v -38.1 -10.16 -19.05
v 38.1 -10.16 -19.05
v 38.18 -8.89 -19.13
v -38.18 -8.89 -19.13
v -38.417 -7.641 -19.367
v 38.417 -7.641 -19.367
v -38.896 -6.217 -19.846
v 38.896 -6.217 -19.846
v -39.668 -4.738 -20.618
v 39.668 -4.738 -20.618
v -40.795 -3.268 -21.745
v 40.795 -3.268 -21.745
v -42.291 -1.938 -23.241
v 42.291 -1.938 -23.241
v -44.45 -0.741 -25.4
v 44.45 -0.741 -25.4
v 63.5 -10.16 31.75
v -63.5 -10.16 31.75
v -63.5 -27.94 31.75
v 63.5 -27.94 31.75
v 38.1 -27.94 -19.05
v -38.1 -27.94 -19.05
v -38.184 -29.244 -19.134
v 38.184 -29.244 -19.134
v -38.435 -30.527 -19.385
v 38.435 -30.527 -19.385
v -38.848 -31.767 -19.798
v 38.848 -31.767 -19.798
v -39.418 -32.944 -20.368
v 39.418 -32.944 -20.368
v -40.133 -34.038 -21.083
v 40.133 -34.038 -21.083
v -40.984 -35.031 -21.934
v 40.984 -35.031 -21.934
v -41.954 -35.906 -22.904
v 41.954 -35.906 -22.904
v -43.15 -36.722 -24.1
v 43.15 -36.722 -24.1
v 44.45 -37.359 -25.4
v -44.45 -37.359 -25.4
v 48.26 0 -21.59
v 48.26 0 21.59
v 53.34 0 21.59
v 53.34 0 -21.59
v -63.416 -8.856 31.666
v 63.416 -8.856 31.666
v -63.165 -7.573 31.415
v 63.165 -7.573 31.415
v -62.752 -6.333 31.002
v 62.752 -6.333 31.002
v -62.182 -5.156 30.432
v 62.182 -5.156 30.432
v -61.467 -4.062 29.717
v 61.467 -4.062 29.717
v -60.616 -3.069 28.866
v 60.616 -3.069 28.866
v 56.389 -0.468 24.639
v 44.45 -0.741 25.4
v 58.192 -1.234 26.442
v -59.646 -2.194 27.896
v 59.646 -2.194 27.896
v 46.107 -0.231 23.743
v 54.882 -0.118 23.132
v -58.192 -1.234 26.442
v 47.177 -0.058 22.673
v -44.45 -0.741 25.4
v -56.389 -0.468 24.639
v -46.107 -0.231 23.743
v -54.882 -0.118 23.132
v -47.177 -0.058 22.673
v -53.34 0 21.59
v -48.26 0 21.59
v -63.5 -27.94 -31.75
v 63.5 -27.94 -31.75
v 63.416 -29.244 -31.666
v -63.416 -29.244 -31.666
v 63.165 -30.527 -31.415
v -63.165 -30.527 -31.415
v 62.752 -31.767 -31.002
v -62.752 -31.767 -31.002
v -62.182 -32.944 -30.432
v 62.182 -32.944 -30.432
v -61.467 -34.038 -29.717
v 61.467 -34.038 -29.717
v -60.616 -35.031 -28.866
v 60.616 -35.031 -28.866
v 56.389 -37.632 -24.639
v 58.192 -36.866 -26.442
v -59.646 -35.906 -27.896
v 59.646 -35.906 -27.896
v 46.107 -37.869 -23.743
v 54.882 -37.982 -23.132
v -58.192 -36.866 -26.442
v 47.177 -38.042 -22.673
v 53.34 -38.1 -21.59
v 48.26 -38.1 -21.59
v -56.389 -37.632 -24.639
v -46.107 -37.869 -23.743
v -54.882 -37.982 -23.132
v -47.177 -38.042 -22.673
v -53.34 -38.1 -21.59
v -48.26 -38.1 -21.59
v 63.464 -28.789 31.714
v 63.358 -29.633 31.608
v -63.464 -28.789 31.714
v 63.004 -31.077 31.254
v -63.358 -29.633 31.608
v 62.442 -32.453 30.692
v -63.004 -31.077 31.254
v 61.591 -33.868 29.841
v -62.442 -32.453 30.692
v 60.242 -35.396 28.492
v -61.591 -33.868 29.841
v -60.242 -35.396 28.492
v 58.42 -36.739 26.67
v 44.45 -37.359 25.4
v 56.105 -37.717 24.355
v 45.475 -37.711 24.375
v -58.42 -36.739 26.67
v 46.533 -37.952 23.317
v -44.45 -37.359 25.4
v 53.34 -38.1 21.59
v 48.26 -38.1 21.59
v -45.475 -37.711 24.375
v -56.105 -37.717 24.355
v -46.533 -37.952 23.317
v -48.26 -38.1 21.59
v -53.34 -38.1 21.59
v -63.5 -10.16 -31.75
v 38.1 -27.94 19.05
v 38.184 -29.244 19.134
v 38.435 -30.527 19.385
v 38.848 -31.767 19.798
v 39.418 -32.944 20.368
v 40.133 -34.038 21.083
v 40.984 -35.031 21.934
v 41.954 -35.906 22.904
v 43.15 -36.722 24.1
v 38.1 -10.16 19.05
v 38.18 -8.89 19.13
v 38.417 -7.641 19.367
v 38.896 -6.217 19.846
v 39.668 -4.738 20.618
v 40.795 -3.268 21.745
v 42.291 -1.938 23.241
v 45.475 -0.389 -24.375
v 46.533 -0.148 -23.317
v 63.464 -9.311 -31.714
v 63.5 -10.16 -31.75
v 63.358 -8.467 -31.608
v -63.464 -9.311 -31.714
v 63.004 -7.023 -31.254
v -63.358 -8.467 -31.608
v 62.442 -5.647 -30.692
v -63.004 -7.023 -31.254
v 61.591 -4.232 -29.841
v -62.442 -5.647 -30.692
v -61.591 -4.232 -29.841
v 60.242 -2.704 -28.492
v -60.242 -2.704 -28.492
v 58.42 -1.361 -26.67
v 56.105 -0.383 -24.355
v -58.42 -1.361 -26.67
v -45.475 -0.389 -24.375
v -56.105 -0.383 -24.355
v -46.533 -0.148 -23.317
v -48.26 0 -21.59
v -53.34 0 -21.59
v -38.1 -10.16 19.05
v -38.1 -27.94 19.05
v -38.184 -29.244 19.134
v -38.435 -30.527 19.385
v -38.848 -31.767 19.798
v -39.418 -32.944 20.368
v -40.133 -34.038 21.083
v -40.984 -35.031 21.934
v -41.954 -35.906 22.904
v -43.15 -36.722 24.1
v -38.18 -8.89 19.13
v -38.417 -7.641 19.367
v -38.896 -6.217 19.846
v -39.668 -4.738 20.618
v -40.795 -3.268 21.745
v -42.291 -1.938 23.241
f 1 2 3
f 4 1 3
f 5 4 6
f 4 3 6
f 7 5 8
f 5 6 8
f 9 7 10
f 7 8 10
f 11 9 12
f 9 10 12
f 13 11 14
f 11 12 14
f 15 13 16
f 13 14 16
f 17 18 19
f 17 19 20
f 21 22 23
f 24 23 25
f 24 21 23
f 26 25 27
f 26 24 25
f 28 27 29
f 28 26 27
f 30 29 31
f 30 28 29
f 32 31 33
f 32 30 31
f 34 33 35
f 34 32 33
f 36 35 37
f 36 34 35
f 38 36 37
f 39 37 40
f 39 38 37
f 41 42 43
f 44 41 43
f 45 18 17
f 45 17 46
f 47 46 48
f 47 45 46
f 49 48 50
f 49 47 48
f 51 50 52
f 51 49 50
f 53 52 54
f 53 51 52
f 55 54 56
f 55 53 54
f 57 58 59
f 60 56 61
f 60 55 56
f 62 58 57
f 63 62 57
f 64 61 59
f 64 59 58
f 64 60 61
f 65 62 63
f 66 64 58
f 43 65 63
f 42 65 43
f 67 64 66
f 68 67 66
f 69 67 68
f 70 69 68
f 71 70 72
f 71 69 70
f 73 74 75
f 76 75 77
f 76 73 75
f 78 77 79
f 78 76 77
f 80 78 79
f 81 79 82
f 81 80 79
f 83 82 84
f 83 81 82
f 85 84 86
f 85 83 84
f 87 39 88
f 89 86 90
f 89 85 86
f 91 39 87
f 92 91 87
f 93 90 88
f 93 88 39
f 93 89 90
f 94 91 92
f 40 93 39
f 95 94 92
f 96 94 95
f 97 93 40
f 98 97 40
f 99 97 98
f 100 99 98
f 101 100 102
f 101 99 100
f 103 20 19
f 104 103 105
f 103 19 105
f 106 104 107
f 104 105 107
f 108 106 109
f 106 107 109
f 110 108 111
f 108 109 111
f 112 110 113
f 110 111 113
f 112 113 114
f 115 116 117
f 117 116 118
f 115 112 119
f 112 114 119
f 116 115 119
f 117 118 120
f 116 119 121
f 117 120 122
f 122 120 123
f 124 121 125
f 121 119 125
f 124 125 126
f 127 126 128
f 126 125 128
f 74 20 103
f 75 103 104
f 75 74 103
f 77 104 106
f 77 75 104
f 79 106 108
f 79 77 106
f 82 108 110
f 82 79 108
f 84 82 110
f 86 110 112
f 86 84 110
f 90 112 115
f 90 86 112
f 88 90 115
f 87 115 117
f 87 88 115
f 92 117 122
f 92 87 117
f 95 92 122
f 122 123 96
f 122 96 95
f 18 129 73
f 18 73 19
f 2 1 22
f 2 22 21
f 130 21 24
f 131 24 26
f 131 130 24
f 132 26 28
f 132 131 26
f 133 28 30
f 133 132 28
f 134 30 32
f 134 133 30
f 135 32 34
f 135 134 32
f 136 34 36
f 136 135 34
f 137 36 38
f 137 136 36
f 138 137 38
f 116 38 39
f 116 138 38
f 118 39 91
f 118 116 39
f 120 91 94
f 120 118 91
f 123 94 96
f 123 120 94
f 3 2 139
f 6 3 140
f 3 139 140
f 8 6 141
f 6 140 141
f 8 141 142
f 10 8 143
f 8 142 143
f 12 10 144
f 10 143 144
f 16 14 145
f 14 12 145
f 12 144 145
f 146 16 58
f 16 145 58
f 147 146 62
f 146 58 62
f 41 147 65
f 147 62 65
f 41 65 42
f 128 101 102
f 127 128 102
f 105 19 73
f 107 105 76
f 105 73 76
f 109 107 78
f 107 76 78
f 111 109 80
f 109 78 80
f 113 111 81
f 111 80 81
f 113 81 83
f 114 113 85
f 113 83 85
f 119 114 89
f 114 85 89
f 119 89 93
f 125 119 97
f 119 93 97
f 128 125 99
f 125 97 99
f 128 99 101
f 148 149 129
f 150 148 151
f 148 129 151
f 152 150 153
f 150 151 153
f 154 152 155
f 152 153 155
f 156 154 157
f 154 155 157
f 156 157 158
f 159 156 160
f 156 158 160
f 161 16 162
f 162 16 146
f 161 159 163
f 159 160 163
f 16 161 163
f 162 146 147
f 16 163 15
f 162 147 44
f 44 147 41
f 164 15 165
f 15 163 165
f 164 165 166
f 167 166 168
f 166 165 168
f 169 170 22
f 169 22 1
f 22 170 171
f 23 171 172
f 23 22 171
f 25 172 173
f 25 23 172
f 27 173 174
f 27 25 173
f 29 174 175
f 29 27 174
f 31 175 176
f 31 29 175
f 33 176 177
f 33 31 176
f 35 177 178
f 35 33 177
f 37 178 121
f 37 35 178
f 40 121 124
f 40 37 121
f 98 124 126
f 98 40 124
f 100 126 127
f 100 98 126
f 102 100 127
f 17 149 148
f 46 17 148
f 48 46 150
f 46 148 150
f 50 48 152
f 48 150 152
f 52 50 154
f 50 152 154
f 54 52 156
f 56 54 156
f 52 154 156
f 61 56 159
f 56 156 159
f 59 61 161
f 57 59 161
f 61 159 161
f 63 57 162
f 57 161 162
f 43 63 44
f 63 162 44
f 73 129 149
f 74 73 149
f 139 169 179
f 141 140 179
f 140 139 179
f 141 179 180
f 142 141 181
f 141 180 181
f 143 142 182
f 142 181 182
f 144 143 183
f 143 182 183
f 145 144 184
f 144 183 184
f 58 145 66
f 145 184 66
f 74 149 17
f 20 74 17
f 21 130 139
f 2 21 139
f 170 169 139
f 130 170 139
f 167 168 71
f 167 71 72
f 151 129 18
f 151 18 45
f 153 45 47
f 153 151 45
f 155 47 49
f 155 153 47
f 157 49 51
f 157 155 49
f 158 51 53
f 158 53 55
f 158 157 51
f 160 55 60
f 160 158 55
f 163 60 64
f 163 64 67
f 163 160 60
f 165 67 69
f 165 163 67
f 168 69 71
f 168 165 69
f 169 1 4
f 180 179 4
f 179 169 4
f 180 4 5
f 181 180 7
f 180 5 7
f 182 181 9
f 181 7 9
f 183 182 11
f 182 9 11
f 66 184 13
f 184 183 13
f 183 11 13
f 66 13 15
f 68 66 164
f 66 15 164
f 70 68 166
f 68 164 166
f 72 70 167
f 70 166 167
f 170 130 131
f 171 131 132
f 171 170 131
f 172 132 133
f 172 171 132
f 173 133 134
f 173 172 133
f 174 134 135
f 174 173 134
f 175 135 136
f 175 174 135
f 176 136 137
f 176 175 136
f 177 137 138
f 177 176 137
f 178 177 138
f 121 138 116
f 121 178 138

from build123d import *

# Parameters (mm, degrees)
F0_W          = 127
F0_H          = 63.5
F0_W_2        = 76.2
F0_H_2        = 38.1
F1_DEPTH      = 38.1
F2_T1_DEPTH   = 177.8
F2_T3_DEPTH   = 114.3
F2_T5_DEPTH   = 76.2
F2_T7_DEPTH   = 38.1
F2_T13_DEPTH  = 101.6
F2_T17_DEPTH  = 63.5
F2_T25_DEPTH  = 101.6
F2_T29_DEPTH  = 63.5
F2_T37_DEPTH  = 63.5
F2_T42_DEPTH  = 101.6
F2_T49_DEPTH  = 101.6
F2_T53_DEPTH  = 63.5
F2_T61_DEPTH  = 101.6
F2_T65_DEPTH  = 63.5
F2_T73_DEPTH  = 101.6
F2_T77_DEPTH  = 63.5
F2_T85_DEPTH  = 63.5
F2_T90_DEPTH  = 101.6
F2_T97_DEPTH  = 101.6
F2_T101_DEPTH = 63.5


# Not quite as in the source:
# - a fillet or chamfer that OpenCascade refuses, or shapes differently, is made with other operations: its cross-section is extruded or revolved along the edge and cut away or added


with BuildPart() as f1:
    # F0 (on Front) → F1 (new body)
    with BuildSketch(Plane.XZ):
        Rectangle(F0_W, F0_H)
        Rectangle(F0_W_2, F0_H_2, mode=Mode.SUBTRACT)
    extrude(amount=F1_DEPTH)

    # F2: fillet of radius 10.16 on 16 edges, made by hand

    # F2_s2 → F2_t1 (cut)
    with BuildSketch(Plane.YZ.offset(-88.9)):
        with BuildLine():
            ThreePointArc((-27.94, -31.75), (-35.1242048969, -28.7742048969), (-38.1, -21.59))
            Line((-38.1, -21.59), (-38.1, -31.75))
            Line((-38.1, -31.75), (-27.94, -31.75))
        make_face()
        with BuildLine():
            ThreePointArc((-27.94, 31.75), (-35.1242048969, 28.7742048969), (-38.1, 21.59))
            Line((-38.1, 21.59), (-38.1, 31.75))
            Line((-38.1, 31.75), (-27.94, 31.75))
        make_face()
        with BuildLine():
            ThreePointArc((-10.16, -31.75), (-2.9757951031, -28.7742048969), (0, -21.59))
            Line((0, -21.59), (0, -31.75))
            Line((0, -31.75), (-10.16, -31.75))
        make_face()
        with BuildLine():
            ThreePointArc((-10.16, 31.75), (-2.9757951031, 28.7742048969), (0, 21.59))
            Line((0, 21.59), (0, 31.75))
            Line((0, 31.75), (-10.16, 31.75))
        make_face()
    extrude(amount=F2_T1_DEPTH, mode=Mode.SUBTRACT)

    # F2_s4 → F2_t3 (cut)
    with BuildSketch(Plane.XY.offset(-57.15)):
        with BuildLine():
            ThreePointArc((63.5, -27.94), (60.5242048969, -35.1242048969), (53.34, -38.1))
            Line((53.34, -38.1), (63.5, -38.1))
            Line((63.5, -38.1), (63.5, -27.94))
        make_face()
        with BuildLine():
            ThreePointArc((-63.5, -27.94), (-60.5242048969, -35.1242048969), (-53.34, -38.1))
            Line((-53.34, -38.1), (-63.5, -38.1))
            Line((-63.5, -38.1), (-63.5, -27.94))
        make_face()
        with BuildLine():
            ThreePointArc((63.5, -10.16), (60.5242048969, -2.9757951031), (53.34, 0))
            Line((53.34, 0), (63.5, 0))
            Line((63.5, 0), (63.5, -10.16))
        make_face()
        with BuildLine():
            ThreePointArc((-63.5, -10.16), (-60.5242048969, -2.9757951031), (-53.34, 0))
            Line((-53.34, 0), (-63.5, 0))
            Line((-63.5, 0), (-63.5, -10.16))
        make_face()
    extrude(amount=F2_T3_DEPTH, mode=Mode.SUBTRACT)

    # F2_s6 → F2_t5 (cut)
    with BuildSketch(Plane.YZ.offset(-38.1)):
        with BuildLine():
            ThreePointArc((-27.94, -19.05), (-35.1242048969, -22.0257951031), (-38.1, -29.21))
            Line((-38.1, -29.21), (-38.1, -19.05))
            Line((-38.1, -19.05), (-27.94, -19.05))
        make_face()
        with BuildLine():
            ThreePointArc((-27.94, 19.05), (-35.1242048969, 22.0257951031), (-38.1, 29.21))
            Line((-38.1, 29.21), (-38.1, 19.05))
            Line((-38.1, 19.05), (-27.94, 19.05))
        make_face()
        with BuildLine():
            ThreePointArc((-10.16, -19.05), (-2.9757951031, -22.0257951031), (0, -29.21))
            Line((0, -29.21), (0, -19.05))
            Line((0, -19.05), (-10.16, -19.05))
        make_face()
        with BuildLine():
            ThreePointArc((-10.16, 19.05), (-2.9757951031, 22.0257951031), (0, 29.21))
            Line((0, 29.21), (0, 19.05))
            Line((0, 19.05), (-10.16, 19.05))
        make_face()
    extrude(amount=F2_T5_DEPTH, mode=Mode.SUBTRACT)

    # F2_s8 → F2_t7 (cut)
    with BuildSketch(Plane.XY.offset(-19.05)):
        with BuildLine():
            ThreePointArc((-38.1, -27.94), (-41.0757951031, -35.1242048969), (-48.26, -38.1))
            Line((-48.26, -38.1), (-38.1, -38.1))
            Line((-38.1, -38.1), (-38.1, -27.94))
        make_face()
        with BuildLine():
            ThreePointArc((38.1, -27.94), (41.0757951031, -35.1242048969), (48.26, -38.1))
            Line((48.26, -38.1), (38.1, -38.1))
            Line((38.1, -38.1), (38.1, -27.94))
        make_face()
        with BuildLine():
            ThreePointArc((-38.1, -10.16), (-41.0757951031, -2.9757951031), (-48.26, 0))
            Line((-48.26, 0), (-38.1, 0))
            Line((-38.1, 0), (-38.1, -10.16))
        make_face()
        with BuildLine():
            ThreePointArc((38.1, -10.16), (41.0757951031, -2.9757951031), (48.26, 0))
            Line((48.26, 0), (38.1, 0))
            Line((38.1, 0), (38.1, -10.16))
        make_face()
    extrude(amount=F2_T7_DEPTH, mode=Mode.SUBTRACT)


with BuildPart() as f2_tool11:
    # F2_s12 → F2_t13 (new body)
    with BuildSketch(Plane.YZ.offset(63.5)):
        with BuildLine():
            ThreePointArc((-27.94, -19.05), (-35.1242048969, -22.0257951031), (-38.1, -29.21))
            Line((-38.1, -29.21), (-38.1, -19.05))
            Line((-38.1, -19.05), (-27.94, -19.05))
        make_face()
    extrude(amount=-F2_T13_DEPTH)

    split(bisect_by=Plane.YZ.offset(38.1), keep=Keep.TOP)


with BuildPart() as f2_tool15:
    # F2_s16 → F2_t17 (new body)
    with BuildSketch(Plane.XY.offset(19.05)):
        with BuildLine():
            ThreePointArc((38.1, -27.94), (41.0757951031, -35.1242048969), (48.26, -38.1))
            Line((48.26, -38.1), (38.1, -38.1))
            Line((38.1, -38.1), (38.1, -27.94))
        make_face()
    extrude(amount=-F2_T17_DEPTH)

    split(bisect_by=Plane.XY.offset(-31.75), keep=Keep.TOP)

    split(bisect_by=Plane.XY.offset(-19.05), keep=Keep.BOTTOM)


with BuildPart() as f2_tool11_1:
    add(f2_tool11.part)

    # F2_t20: intersect F2_tool15
    add(f2_tool15.part, mode=Mode.INTERSECT)


with BuildPart() as f1_1:
    add(f1.part)

    # F2_t9: cut F2_tool11
    add(f2_tool11_1.part, mode=Mode.SUBTRACT)


with BuildPart() as f2_tool23:
    # F2_s24 → F2_t25 (new body)
    with BuildSketch(Plane.YZ.offset(38.1)):
        with BuildLine():
            ThreePointArc((-27.94, -19.05), (-35.1242048969, -22.0257951031), (-38.1, -29.21))
            Line((-38.1, -29.21), (-38.1, -19.05))
            Line((-38.1, -19.05), (-27.94, -19.05))
        make_face()
    extrude(amount=-F2_T25_DEPTH)

    split(bisect_by=Plane.YZ.offset(-38.1), keep=Keep.BOTTOM)


with BuildPart() as f2_tool27:
    # F2_s28 → F2_t29 (new body)
    with BuildSketch(Plane.XY.offset(-44.45)):
        with BuildLine():
            ThreePointArc((-38.1, -27.94), (-41.0757951031, -35.1242048969), (-48.26, -38.1))
            Line((-48.26, -38.1), (-38.1, -38.1))
            Line((-38.1, -38.1), (-38.1, -27.94))
        make_face()
    extrude(amount=F2_T29_DEPTH)

    split(bisect_by=Plane.XY.offset(-31.75), keep=Keep.TOP)

    split(bisect_by=Plane.XY.offset(-19.05), keep=Keep.BOTTOM)


with BuildPart() as f2_tool23_1:
    add(f2_tool23.part)

    # F2_t32: intersect F2_tool27
    add(f2_tool27.part, mode=Mode.INTERSECT)


with BuildPart() as f1_2:
    add(f1_1.part)

    # F2_t21: cut F2_tool23
    add(f2_tool23_1.part, mode=Mode.SUBTRACT)


with BuildPart() as f2_tool35:
    # F2_s36 → F2_t37 (new body)
    with BuildSketch(Plane.XY.offset(-19.05)):
        with BuildLine():
            ThreePointArc((-38.1, -27.94), (-41.0757951031, -35.1242048969), (-48.26, -38.1))
            Line((-48.26, -38.1), (-38.1, -38.1))
            Line((-38.1, -38.1), (-38.1, -27.94))
        make_face()
    extrude(amount=F2_T37_DEPTH)

    split(bisect_by=Plane.XY.offset(31.75), keep=Keep.BOTTOM)

    split(bisect_by=Plane.XY.offset(19.05), keep=Keep.TOP)


with BuildPart() as f2_tool40:
    # F2_s41 → F2_t42 (new body)
    with BuildSketch(Plane.YZ.offset(-63.5)):
        with BuildLine():
            ThreePointArc((-27.94, 19.05), (-35.1242048969, 22.0257951031), (-38.1, 29.21))
            Line((-38.1, 29.21), (-38.1, 19.05))
            Line((-38.1, 19.05), (-27.94, 19.05))
        make_face()
    extrude(amount=F2_T42_DEPTH)

    split(bisect_by=Plane.YZ.offset(-38.1), keep=Keep.BOTTOM)


with BuildPart() as f2_tool35_1:
    add(f2_tool35.part)

    # F2_t44: intersect F2_tool40
    add(f2_tool40.part, mode=Mode.INTERSECT)


with BuildPart() as f1_3:
    add(f1_2.part)

    # F2_t33: cut F2_tool35
    add(f2_tool35_1.part, mode=Mode.SUBTRACT)


with BuildPart() as f2_tool47:
    # F2_s48 → F2_t49 (new body)
    with BuildSketch(Plane.YZ.offset(-38.1)):
        with BuildLine():
            ThreePointArc((-27.94, 19.05), (-35.1242048969, 22.0257951031), (-38.1, 29.21))
            Line((-38.1, 29.21), (-38.1, 19.05))
            Line((-38.1, 19.05), (-27.94, 19.05))
        make_face()
    extrude(amount=F2_T49_DEPTH)

    split(bisect_by=Plane.YZ.offset(38.1), keep=Keep.TOP)


with BuildPart() as f2_tool51:
    # F2_s52 → F2_t53 (new body)
    with BuildSketch(Plane.XY.offset(44.45)):
        with BuildLine():
            ThreePointArc((38.1, -27.94), (41.0757951031, -35.1242048969), (48.26, -38.1))
            Line((48.26, -38.1), (38.1, -38.1))
            Line((38.1, -38.1), (38.1, -27.94))
        make_face()
    extrude(amount=-F2_T53_DEPTH)

    split(bisect_by=Plane.XY.offset(31.75), keep=Keep.BOTTOM)

    split(bisect_by=Plane.XY.offset(19.05), keep=Keep.TOP)


with BuildPart() as f2_tool47_1:
    add(f2_tool47.part)

    # F2_t56: intersect F2_tool51
    add(f2_tool51.part, mode=Mode.INTERSECT)


with BuildPart() as f1_4:
    add(f1_3.part)

    # F2_t45: cut F2_tool47
    add(f2_tool47_1.part, mode=Mode.SUBTRACT)


with BuildPart() as f2_tool59:
    # F2_s60 → F2_t61 (new body)
    with BuildSketch(Plane.YZ.offset(63.5)):
        with BuildLine():
            ThreePointArc((-10.16, -19.05), (-2.9757951031, -22.0257951031), (0, -29.21))
            Line((0, -29.21), (0, -19.05))
            Line((0, -19.05), (-10.16, -19.05))
        make_face()
    extrude(amount=-F2_T61_DEPTH)

    split(bisect_by=Plane.YZ.offset(38.1), keep=Keep.TOP)


with BuildPart() as f2_tool63:
    # F2_s64 → F2_t65 (new body)
    with BuildSketch(Plane.XY.offset(19.05)):
        with BuildLine():
            ThreePointArc((38.1, -10.16), (41.0757951031, -2.9757951031), (48.26, 0))
            Line((48.26, 0), (38.1, 0))
            Line((38.1, 0), (38.1, -10.16))
        make_face()
    extrude(amount=-F2_T65_DEPTH)

    split(bisect_by=Plane.XY.offset(-31.75), keep=Keep.TOP)

    split(bisect_by=Plane.XY.offset(-19.05), keep=Keep.BOTTOM)


with BuildPart() as f2_tool59_1:
    add(f2_tool59.part)

    # F2_t68: intersect F2_tool63
    add(f2_tool63.part, mode=Mode.INTERSECT)


with BuildPart() as f1_5:
    add(f1_4.part)

    # F2_t57: cut F2_tool59
    add(f2_tool59_1.part, mode=Mode.SUBTRACT)


with BuildPart() as f2_tool71:
    # F2_s72 → F2_t73 (new body)
    with BuildSketch(Plane.YZ.offset(38.1)):
        with BuildLine():
            ThreePointArc((-10.16, -19.05), (-2.9757951031, -22.0257951031), (0, -29.21))
            Line((0, -29.21), (0, -19.05))
            Line((0, -19.05), (-10.16, -19.05))
        make_face()
    extrude(amount=-F2_T73_DEPTH)

    split(bisect_by=Plane.YZ.offset(-38.1), keep=Keep.BOTTOM)


with BuildPart() as f2_tool75:
    # F2_s76 → F2_t77 (new body)
    with BuildSketch(Plane.XY.offset(-44.45)):
        with BuildLine():
            ThreePointArc((-38.1, -10.16), (-41.0757951031, -2.9757951031), (-48.26, 0))
            Line((-48.26, 0), (-38.1, 0))
            Line((-38.1, 0), (-38.1, -10.16))
        make_face()
    extrude(amount=F2_T77_DEPTH)

    split(bisect_by=Plane.XY.offset(-31.75), keep=Keep.TOP)

    split(bisect_by=Plane.XY.offset(-19.05), keep=Keep.BOTTOM)


with BuildPart() as f2_tool71_1:
    add(f2_tool71.part)

    # F2_t80: intersect F2_tool75
    add(f2_tool75.part, mode=Mode.INTERSECT)


with BuildPart() as f1_6:
    add(f1_5.part)

    # F2_t69: cut F2_tool71
    add(f2_tool71_1.part, mode=Mode.SUBTRACT)


with BuildPart() as f2_tool83:
    # F2_s84 → F2_t85 (new body)
    with BuildSketch(Plane.XY.offset(-19.05)):
        with BuildLine():
            ThreePointArc((-38.1, -10.16), (-41.0757951031, -2.9757951031), (-48.26, 0))
            Line((-48.26, 0), (-38.1, 0))
            Line((-38.1, 0), (-38.1, -10.16))
        make_face()
    extrude(amount=F2_T85_DEPTH)

    split(bisect_by=Plane.XY.offset(31.75), keep=Keep.BOTTOM)

    split(bisect_by=Plane.XY.offset(19.05), keep=Keep.TOP)


with BuildPart() as f2_tool88:
    # F2_s89 → F2_t90 (new body)
    with BuildSketch(Plane.YZ.offset(-63.5)):
        with BuildLine():
            ThreePointArc((-10.16, 19.05), (-2.9757951031, 22.0257951031), (0, 29.21))
            Line((0, 29.21), (0, 19.05))
            Line((0, 19.05), (-10.16, 19.05))
        make_face()
    extrude(amount=F2_T90_DEPTH)

    split(bisect_by=Plane.YZ.offset(-38.1), keep=Keep.BOTTOM)


with BuildPart() as f2_tool83_1:
    add(f2_tool83.part)

    # F2_t92: intersect F2_tool88
    add(f2_tool88.part, mode=Mode.INTERSECT)


with BuildPart() as f1_7:
    add(f1_6.part)

    # F2_t81: cut F2_tool83
    add(f2_tool83_1.part, mode=Mode.SUBTRACT)


with BuildPart() as f2_tool95:
    # F2_s96 → F2_t97 (new body)
    with BuildSketch(Plane.YZ.offset(-38.1)):
        with BuildLine():
            ThreePointArc((-10.16, 19.05), (-2.9757951031, 22.0257951031), (0, 29.21))
            Line((0, 29.21), (0, 19.05))
            Line((0, 19.05), (-10.16, 19.05))
        make_face()
    extrude(amount=F2_T97_DEPTH)

    split(bisect_by=Plane.YZ.offset(38.1), keep=Keep.TOP)


with BuildPart() as f2_tool99:
    # F2_s100 → F2_t101 (new body)
    with BuildSketch(Plane.XY.offset(44.45)):
        with BuildLine():
            ThreePointArc((38.1, -10.16), (41.0757951031, -2.9757951031), (48.26, 0))
            Line((48.26, 0), (38.1, 0))
            Line((38.1, 0), (38.1, -10.16))
        make_face()
    extrude(amount=-F2_T101_DEPTH)

    split(bisect_by=Plane.XY.offset(31.75), keep=Keep.BOTTOM)

    split(bisect_by=Plane.XY.offset(19.05), keep=Keep.TOP)


with BuildPart() as f2_tool95_1:
    add(f2_tool95.part)

    # F2_t104: intersect F2_tool99
    add(f2_tool99.part, mode=Mode.INTERSECT)


with BuildPart() as f1_8:
    add(f1_7.part)

    # F2_t93: cut F2_tool95
    add(f2_tool95_1.part, mode=Mode.SUBTRACT)


solid = f1_8.part
